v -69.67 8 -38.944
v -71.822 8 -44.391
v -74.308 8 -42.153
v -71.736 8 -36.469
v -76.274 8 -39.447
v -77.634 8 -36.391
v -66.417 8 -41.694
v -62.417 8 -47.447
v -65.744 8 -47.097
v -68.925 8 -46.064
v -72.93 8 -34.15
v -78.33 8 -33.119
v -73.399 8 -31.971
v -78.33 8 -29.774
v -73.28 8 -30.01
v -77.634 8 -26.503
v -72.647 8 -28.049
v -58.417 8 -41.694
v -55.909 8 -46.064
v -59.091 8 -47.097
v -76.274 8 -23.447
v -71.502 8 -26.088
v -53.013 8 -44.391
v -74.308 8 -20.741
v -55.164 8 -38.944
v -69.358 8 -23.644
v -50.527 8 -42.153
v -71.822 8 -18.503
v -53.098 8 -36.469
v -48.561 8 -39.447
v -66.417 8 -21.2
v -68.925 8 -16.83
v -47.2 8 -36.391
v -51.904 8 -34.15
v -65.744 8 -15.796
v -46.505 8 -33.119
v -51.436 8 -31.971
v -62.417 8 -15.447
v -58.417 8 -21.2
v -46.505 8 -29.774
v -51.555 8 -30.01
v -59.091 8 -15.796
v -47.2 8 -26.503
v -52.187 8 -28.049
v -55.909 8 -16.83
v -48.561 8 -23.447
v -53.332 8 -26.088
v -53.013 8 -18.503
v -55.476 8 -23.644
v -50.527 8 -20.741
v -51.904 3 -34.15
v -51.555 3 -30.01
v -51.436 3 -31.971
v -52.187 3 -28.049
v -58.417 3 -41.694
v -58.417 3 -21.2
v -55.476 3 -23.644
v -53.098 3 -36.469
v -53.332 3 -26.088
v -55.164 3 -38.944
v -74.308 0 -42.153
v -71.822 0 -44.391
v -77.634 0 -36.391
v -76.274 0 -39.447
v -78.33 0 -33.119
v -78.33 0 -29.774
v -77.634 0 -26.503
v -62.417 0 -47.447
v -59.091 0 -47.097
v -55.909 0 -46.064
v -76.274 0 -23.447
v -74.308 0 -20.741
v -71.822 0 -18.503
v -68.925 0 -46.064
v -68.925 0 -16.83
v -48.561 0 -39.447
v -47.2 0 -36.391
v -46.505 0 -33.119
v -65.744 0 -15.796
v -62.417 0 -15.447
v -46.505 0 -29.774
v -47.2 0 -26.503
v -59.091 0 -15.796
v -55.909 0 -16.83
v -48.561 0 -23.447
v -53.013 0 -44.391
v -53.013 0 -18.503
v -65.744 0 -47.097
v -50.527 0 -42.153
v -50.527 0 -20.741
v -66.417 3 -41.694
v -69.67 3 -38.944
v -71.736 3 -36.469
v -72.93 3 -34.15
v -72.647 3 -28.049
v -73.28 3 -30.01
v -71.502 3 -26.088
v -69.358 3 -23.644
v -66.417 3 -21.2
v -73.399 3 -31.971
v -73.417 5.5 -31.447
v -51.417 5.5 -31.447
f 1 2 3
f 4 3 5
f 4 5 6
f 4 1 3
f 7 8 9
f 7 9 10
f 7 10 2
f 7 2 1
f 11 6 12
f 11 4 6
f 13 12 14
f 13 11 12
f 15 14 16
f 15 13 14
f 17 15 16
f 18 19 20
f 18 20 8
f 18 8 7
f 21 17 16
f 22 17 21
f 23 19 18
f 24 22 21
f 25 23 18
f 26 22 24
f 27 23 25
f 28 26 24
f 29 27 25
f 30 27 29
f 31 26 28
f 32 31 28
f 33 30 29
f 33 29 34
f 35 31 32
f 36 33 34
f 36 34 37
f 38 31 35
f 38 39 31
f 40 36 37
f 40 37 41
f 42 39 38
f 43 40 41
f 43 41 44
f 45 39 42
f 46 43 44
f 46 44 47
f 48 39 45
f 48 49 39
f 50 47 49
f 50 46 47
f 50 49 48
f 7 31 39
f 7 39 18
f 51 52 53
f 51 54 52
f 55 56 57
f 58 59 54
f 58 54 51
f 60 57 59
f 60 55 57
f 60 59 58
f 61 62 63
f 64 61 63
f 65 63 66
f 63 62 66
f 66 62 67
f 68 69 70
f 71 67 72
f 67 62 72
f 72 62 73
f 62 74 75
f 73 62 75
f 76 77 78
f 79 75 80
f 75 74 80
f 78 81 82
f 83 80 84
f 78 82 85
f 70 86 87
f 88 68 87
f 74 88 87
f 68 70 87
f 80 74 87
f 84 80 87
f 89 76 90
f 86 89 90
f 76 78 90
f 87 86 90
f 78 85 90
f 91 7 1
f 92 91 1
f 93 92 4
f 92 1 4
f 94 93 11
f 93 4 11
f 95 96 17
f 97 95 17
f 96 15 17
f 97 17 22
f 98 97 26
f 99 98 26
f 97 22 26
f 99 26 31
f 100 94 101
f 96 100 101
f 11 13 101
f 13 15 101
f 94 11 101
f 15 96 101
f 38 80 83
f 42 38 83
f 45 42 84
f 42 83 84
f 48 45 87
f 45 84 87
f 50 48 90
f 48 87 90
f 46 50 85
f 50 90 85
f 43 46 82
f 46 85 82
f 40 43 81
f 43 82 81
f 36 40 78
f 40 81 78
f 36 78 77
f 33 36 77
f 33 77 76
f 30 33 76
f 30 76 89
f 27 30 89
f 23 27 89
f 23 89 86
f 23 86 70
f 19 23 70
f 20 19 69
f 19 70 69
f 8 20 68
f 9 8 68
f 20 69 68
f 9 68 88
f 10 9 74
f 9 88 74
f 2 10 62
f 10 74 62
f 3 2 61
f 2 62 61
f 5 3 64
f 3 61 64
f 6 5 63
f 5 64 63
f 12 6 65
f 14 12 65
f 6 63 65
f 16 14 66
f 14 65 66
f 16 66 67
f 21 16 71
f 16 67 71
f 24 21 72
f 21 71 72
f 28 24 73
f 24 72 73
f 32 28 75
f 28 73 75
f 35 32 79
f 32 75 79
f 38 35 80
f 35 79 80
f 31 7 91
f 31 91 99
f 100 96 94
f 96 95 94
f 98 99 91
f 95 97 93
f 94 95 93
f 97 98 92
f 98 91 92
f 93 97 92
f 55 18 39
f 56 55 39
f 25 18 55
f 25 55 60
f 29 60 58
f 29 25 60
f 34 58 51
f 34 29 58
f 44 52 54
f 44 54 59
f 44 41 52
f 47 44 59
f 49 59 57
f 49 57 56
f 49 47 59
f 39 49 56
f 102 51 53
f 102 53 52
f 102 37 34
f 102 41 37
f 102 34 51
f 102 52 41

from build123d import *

# Parameters (mm, degrees)
SKETCH1_R           = 16
BOSS_EXTRUDE1_DEPTH = 8
CUT_EXTRUDE2_DEPTH  = 5


with BuildPart() as part:
    # Sketch1 → Boss-Extrude1 (new body)
    with BuildSketch(Plane(origin=(0, 0, 0), x_dir=(1, 0, 0), z_dir=(0, 1, 0))):
        with Locations(Location((-62.417227704, 31.446847546, 0), (0, 0, 270))):
            Circle(SKETCH1_R)
    extrude(amount=BOSS_EXTRUDE1_DEPTH)

    # Sketch9 → Cut-Extrude2 (cut)
    with BuildSketch(Plane(origin=(0, 8, 0), x_dir=(1, 0, 0), z_dir=(0, 1, 0))):
        with BuildLine():
            Line((-66.417227704, 41.693798311), (-66.417227704, 31.446847546))
            Line((-66.417227704, 31.446847546), (-66.417227704, 21.19989678))
            add(Edge.make_bspline(
                [(-66.417227704, 41.693798311), (-80.417227704, 31.446847546), (-66.417227704, 21.19989678)],
                knots=[0, 0, 0, 1, 1, 1], degree=2))
        make_face()
        with BuildLine():
            Line((-58.417227704, 41.693798311), (-58.417227704, 21.19989678))
            add(Edge.make_bspline(
                [(-58.417227704, 41.693798311), (-44.417227704, 31.446847546), (-58.417227704, 21.19989678)],
                knots=[0, 0, 0, 1, 1, 1], degree=2))
        make_face()
    extrude(amount=-CUT_EXTRUDE2_DEPTH, mode=Mode.SUBTRACT)


solid = part.part
